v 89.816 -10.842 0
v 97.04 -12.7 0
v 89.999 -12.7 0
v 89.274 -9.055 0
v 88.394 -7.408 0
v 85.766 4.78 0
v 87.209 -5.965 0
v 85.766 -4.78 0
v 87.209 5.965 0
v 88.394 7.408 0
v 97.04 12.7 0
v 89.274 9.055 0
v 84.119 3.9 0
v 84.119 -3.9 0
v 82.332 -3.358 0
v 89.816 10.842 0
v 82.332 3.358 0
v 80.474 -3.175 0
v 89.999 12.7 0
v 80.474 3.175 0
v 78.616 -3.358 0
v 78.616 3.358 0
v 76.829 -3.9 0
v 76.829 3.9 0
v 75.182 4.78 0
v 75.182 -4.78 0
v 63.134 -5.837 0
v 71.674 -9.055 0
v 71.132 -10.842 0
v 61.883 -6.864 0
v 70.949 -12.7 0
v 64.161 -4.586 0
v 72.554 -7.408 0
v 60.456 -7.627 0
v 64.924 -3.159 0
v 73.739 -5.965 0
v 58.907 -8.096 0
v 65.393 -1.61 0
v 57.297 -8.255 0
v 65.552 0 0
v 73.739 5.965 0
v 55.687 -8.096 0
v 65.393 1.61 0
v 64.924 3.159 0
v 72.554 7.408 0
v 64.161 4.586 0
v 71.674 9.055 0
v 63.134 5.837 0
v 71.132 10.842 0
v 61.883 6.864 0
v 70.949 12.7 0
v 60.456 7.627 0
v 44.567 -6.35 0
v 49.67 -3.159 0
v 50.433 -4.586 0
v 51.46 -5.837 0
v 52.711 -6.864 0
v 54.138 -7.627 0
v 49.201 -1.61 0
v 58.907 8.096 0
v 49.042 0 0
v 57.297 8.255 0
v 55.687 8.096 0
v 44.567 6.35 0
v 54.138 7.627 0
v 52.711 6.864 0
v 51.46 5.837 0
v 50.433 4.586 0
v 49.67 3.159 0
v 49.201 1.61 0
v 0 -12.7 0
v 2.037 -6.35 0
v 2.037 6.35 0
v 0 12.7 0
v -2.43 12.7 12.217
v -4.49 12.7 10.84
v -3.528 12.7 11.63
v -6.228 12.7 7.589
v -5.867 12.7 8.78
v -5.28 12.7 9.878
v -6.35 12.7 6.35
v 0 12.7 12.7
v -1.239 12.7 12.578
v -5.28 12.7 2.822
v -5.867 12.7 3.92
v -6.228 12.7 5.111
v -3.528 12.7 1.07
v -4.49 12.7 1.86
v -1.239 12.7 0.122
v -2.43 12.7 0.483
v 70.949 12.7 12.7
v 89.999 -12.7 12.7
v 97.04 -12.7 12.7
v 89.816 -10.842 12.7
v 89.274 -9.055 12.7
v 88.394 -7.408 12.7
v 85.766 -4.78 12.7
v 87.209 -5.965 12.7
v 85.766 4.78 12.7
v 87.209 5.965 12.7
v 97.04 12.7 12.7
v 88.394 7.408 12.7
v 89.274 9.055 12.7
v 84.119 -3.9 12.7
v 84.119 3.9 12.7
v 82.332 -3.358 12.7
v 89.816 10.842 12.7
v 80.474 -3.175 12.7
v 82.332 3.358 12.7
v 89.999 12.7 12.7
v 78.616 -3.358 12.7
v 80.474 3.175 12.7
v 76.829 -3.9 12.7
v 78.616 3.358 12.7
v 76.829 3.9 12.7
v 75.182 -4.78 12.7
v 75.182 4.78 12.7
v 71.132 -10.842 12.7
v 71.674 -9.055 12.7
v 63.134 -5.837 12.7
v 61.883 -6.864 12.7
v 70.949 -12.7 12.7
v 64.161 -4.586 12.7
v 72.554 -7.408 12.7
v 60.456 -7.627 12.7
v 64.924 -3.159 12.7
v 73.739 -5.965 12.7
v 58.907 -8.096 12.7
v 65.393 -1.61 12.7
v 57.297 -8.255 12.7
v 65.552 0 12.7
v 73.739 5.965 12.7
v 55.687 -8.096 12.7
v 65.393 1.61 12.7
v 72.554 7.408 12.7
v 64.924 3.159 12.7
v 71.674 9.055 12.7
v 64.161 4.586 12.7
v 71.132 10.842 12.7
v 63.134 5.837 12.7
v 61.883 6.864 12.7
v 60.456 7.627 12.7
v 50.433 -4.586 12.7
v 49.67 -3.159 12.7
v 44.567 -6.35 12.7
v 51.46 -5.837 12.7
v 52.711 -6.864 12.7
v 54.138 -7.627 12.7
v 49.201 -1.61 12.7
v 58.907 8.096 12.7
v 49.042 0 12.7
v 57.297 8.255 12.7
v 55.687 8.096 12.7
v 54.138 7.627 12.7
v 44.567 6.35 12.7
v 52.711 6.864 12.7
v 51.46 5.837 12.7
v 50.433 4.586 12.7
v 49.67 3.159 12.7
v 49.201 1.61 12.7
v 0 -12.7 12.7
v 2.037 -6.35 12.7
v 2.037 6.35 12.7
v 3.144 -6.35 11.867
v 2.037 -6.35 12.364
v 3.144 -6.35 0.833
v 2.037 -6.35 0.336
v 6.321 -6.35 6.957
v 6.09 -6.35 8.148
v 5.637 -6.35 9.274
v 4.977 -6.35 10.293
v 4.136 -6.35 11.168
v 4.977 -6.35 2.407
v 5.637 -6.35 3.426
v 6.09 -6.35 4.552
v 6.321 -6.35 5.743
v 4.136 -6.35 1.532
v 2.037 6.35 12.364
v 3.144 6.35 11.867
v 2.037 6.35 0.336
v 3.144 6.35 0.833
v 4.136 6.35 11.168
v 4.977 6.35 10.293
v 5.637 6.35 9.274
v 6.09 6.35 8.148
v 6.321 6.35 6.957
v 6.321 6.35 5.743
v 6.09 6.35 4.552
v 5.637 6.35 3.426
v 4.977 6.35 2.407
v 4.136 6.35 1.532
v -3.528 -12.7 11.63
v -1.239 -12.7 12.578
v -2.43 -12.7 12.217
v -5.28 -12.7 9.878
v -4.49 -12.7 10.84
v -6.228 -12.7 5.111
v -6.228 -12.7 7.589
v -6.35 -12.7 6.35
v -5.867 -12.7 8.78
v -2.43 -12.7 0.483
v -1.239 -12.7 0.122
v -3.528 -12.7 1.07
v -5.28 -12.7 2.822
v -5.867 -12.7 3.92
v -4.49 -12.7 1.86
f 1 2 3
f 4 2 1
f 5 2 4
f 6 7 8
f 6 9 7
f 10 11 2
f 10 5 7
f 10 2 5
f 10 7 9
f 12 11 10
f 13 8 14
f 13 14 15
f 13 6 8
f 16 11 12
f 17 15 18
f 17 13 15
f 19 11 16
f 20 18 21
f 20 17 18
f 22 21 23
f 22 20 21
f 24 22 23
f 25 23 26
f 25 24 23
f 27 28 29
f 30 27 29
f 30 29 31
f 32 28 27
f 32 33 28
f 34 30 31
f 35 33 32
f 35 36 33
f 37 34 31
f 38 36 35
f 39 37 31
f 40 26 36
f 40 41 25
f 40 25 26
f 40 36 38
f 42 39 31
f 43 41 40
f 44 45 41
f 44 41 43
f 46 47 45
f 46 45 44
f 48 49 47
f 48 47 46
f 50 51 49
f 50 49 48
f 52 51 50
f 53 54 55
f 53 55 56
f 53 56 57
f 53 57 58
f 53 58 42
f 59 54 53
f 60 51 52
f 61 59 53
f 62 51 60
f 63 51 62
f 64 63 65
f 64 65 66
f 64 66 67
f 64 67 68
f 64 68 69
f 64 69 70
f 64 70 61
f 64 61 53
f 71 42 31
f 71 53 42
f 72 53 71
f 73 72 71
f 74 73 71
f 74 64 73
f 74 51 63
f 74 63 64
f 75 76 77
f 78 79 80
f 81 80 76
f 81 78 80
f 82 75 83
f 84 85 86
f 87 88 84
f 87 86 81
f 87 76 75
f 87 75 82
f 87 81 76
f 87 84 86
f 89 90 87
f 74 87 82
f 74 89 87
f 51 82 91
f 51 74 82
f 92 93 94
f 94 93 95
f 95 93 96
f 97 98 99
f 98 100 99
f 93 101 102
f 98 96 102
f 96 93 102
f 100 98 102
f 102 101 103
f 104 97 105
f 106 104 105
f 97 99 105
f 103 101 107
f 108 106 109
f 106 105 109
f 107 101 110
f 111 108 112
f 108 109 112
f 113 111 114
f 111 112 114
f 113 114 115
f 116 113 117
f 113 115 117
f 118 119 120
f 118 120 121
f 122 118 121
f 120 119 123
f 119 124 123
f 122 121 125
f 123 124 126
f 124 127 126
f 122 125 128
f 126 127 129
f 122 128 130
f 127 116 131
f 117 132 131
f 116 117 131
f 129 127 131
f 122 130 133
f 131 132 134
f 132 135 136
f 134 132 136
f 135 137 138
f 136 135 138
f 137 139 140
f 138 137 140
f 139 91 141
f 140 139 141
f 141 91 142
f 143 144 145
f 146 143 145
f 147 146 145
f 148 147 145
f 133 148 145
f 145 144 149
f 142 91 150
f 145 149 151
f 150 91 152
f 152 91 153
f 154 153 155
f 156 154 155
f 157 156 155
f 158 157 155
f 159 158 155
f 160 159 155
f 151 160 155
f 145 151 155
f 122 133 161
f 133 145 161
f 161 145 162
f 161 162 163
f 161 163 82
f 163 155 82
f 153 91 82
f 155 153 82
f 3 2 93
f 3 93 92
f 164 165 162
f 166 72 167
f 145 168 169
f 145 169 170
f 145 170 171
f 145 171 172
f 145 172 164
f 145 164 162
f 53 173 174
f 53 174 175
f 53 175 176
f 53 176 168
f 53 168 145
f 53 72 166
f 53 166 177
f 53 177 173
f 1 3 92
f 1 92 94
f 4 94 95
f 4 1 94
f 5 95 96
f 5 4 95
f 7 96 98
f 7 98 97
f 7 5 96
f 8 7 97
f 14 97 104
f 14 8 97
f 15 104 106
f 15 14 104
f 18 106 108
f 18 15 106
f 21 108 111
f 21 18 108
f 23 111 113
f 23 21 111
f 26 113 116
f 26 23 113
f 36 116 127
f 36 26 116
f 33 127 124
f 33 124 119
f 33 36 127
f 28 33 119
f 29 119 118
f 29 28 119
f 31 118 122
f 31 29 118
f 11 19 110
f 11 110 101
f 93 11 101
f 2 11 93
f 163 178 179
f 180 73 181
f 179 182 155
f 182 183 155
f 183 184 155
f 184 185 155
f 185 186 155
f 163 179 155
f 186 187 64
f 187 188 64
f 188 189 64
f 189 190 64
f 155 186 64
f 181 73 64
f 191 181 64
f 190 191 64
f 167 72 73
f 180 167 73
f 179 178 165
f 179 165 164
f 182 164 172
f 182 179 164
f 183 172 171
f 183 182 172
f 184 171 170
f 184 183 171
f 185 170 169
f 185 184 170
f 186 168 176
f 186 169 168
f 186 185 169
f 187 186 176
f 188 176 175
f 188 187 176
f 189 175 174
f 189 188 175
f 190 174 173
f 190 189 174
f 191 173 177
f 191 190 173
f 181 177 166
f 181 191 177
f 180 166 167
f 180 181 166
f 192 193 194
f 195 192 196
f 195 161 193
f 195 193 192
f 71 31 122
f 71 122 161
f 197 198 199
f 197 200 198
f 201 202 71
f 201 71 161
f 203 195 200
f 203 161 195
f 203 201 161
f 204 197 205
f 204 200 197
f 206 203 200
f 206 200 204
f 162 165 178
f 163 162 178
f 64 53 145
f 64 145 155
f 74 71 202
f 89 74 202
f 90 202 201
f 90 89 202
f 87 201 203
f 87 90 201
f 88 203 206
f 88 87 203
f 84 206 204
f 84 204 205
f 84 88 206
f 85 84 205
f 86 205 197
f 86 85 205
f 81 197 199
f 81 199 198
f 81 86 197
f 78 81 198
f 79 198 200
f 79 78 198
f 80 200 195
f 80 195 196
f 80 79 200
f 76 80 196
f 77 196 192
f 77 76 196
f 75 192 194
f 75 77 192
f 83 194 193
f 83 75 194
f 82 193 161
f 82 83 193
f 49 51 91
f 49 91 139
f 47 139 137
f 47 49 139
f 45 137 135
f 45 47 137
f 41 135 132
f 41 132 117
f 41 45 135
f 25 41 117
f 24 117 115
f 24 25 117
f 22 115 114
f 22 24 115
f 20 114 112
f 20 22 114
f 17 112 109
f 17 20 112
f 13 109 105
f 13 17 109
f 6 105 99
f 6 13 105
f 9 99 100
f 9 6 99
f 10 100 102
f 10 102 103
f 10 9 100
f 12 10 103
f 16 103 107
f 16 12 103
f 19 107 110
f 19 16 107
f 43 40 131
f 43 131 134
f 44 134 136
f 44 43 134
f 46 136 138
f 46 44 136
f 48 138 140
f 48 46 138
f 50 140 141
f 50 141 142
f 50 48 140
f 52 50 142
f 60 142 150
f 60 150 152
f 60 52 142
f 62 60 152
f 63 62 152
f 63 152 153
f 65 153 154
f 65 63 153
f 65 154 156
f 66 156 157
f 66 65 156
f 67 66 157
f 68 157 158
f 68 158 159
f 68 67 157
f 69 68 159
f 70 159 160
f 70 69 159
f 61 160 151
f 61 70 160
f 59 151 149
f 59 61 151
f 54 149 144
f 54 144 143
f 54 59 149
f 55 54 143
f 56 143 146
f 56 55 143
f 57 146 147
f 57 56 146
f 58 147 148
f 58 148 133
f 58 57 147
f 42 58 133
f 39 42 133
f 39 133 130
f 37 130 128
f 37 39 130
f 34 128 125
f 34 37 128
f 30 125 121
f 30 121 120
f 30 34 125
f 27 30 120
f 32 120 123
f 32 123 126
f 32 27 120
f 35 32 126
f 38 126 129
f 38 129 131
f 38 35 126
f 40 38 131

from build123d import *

# Parameters (mm, degrees)
SKETCH1_R           = 8.255
SKETCH1_W           = 42.529452224
SKETCH1_H           = 12.7
BOSS_EXTRUDE1_DEPTH = 12.7
SKETCH2_R           = 6.35
BOSS_EXTRUDE2_DEPTH = 25.4


with BuildPart() as part:
    # Sketch1 → Boss-Extrude1 (new body)
    with BuildSketch(Plane.XY):
        with BuildLine():
            Line((89.999184934, 12.7), (97.04, 12.7))
            Line((97.04, 12.7), (97.04, -12.7))
            Line((97.04, -12.7), (89.999184934, -12.7))
            ThreePointArc((89.999184934, -12.7), (80.474184934, -3.175), (70.949184934, -12.7))
            Line((70.949184934, -12.7), (0, -12.7))
            Line((0, -12.7), (0, 12.7))
            Line((0, 12.7), (70.949184934, 12.7))
            ThreePointArc((70.949184934, 12.7), (80.474184934, 3.175), (89.999184934, 12.7))
        make_face()
        with Locations((57.297, 0)):
            Circle(SKETCH1_R, mode=Mode.SUBTRACT)
        with Locations((23.301842553, 0)):
            Rectangle(SKETCH1_W, SKETCH1_H, mode=Mode.SUBTRACT)
    extrude(amount=BOSS_EXTRUDE1_DEPTH)

    # Sketch2 → Boss-Extrude2 (add, through all)
    with BuildSketch(Plane(origin=(0, 12.7, 0), x_dir=(1, 0, 0), z_dir=(0, 1, 0))):
        with Locations((0, -6.35)):
            Circle(SKETCH2_R)
    extrude(amount=-BOSS_EXTRUDE2_DEPTH)


solid = part.part
